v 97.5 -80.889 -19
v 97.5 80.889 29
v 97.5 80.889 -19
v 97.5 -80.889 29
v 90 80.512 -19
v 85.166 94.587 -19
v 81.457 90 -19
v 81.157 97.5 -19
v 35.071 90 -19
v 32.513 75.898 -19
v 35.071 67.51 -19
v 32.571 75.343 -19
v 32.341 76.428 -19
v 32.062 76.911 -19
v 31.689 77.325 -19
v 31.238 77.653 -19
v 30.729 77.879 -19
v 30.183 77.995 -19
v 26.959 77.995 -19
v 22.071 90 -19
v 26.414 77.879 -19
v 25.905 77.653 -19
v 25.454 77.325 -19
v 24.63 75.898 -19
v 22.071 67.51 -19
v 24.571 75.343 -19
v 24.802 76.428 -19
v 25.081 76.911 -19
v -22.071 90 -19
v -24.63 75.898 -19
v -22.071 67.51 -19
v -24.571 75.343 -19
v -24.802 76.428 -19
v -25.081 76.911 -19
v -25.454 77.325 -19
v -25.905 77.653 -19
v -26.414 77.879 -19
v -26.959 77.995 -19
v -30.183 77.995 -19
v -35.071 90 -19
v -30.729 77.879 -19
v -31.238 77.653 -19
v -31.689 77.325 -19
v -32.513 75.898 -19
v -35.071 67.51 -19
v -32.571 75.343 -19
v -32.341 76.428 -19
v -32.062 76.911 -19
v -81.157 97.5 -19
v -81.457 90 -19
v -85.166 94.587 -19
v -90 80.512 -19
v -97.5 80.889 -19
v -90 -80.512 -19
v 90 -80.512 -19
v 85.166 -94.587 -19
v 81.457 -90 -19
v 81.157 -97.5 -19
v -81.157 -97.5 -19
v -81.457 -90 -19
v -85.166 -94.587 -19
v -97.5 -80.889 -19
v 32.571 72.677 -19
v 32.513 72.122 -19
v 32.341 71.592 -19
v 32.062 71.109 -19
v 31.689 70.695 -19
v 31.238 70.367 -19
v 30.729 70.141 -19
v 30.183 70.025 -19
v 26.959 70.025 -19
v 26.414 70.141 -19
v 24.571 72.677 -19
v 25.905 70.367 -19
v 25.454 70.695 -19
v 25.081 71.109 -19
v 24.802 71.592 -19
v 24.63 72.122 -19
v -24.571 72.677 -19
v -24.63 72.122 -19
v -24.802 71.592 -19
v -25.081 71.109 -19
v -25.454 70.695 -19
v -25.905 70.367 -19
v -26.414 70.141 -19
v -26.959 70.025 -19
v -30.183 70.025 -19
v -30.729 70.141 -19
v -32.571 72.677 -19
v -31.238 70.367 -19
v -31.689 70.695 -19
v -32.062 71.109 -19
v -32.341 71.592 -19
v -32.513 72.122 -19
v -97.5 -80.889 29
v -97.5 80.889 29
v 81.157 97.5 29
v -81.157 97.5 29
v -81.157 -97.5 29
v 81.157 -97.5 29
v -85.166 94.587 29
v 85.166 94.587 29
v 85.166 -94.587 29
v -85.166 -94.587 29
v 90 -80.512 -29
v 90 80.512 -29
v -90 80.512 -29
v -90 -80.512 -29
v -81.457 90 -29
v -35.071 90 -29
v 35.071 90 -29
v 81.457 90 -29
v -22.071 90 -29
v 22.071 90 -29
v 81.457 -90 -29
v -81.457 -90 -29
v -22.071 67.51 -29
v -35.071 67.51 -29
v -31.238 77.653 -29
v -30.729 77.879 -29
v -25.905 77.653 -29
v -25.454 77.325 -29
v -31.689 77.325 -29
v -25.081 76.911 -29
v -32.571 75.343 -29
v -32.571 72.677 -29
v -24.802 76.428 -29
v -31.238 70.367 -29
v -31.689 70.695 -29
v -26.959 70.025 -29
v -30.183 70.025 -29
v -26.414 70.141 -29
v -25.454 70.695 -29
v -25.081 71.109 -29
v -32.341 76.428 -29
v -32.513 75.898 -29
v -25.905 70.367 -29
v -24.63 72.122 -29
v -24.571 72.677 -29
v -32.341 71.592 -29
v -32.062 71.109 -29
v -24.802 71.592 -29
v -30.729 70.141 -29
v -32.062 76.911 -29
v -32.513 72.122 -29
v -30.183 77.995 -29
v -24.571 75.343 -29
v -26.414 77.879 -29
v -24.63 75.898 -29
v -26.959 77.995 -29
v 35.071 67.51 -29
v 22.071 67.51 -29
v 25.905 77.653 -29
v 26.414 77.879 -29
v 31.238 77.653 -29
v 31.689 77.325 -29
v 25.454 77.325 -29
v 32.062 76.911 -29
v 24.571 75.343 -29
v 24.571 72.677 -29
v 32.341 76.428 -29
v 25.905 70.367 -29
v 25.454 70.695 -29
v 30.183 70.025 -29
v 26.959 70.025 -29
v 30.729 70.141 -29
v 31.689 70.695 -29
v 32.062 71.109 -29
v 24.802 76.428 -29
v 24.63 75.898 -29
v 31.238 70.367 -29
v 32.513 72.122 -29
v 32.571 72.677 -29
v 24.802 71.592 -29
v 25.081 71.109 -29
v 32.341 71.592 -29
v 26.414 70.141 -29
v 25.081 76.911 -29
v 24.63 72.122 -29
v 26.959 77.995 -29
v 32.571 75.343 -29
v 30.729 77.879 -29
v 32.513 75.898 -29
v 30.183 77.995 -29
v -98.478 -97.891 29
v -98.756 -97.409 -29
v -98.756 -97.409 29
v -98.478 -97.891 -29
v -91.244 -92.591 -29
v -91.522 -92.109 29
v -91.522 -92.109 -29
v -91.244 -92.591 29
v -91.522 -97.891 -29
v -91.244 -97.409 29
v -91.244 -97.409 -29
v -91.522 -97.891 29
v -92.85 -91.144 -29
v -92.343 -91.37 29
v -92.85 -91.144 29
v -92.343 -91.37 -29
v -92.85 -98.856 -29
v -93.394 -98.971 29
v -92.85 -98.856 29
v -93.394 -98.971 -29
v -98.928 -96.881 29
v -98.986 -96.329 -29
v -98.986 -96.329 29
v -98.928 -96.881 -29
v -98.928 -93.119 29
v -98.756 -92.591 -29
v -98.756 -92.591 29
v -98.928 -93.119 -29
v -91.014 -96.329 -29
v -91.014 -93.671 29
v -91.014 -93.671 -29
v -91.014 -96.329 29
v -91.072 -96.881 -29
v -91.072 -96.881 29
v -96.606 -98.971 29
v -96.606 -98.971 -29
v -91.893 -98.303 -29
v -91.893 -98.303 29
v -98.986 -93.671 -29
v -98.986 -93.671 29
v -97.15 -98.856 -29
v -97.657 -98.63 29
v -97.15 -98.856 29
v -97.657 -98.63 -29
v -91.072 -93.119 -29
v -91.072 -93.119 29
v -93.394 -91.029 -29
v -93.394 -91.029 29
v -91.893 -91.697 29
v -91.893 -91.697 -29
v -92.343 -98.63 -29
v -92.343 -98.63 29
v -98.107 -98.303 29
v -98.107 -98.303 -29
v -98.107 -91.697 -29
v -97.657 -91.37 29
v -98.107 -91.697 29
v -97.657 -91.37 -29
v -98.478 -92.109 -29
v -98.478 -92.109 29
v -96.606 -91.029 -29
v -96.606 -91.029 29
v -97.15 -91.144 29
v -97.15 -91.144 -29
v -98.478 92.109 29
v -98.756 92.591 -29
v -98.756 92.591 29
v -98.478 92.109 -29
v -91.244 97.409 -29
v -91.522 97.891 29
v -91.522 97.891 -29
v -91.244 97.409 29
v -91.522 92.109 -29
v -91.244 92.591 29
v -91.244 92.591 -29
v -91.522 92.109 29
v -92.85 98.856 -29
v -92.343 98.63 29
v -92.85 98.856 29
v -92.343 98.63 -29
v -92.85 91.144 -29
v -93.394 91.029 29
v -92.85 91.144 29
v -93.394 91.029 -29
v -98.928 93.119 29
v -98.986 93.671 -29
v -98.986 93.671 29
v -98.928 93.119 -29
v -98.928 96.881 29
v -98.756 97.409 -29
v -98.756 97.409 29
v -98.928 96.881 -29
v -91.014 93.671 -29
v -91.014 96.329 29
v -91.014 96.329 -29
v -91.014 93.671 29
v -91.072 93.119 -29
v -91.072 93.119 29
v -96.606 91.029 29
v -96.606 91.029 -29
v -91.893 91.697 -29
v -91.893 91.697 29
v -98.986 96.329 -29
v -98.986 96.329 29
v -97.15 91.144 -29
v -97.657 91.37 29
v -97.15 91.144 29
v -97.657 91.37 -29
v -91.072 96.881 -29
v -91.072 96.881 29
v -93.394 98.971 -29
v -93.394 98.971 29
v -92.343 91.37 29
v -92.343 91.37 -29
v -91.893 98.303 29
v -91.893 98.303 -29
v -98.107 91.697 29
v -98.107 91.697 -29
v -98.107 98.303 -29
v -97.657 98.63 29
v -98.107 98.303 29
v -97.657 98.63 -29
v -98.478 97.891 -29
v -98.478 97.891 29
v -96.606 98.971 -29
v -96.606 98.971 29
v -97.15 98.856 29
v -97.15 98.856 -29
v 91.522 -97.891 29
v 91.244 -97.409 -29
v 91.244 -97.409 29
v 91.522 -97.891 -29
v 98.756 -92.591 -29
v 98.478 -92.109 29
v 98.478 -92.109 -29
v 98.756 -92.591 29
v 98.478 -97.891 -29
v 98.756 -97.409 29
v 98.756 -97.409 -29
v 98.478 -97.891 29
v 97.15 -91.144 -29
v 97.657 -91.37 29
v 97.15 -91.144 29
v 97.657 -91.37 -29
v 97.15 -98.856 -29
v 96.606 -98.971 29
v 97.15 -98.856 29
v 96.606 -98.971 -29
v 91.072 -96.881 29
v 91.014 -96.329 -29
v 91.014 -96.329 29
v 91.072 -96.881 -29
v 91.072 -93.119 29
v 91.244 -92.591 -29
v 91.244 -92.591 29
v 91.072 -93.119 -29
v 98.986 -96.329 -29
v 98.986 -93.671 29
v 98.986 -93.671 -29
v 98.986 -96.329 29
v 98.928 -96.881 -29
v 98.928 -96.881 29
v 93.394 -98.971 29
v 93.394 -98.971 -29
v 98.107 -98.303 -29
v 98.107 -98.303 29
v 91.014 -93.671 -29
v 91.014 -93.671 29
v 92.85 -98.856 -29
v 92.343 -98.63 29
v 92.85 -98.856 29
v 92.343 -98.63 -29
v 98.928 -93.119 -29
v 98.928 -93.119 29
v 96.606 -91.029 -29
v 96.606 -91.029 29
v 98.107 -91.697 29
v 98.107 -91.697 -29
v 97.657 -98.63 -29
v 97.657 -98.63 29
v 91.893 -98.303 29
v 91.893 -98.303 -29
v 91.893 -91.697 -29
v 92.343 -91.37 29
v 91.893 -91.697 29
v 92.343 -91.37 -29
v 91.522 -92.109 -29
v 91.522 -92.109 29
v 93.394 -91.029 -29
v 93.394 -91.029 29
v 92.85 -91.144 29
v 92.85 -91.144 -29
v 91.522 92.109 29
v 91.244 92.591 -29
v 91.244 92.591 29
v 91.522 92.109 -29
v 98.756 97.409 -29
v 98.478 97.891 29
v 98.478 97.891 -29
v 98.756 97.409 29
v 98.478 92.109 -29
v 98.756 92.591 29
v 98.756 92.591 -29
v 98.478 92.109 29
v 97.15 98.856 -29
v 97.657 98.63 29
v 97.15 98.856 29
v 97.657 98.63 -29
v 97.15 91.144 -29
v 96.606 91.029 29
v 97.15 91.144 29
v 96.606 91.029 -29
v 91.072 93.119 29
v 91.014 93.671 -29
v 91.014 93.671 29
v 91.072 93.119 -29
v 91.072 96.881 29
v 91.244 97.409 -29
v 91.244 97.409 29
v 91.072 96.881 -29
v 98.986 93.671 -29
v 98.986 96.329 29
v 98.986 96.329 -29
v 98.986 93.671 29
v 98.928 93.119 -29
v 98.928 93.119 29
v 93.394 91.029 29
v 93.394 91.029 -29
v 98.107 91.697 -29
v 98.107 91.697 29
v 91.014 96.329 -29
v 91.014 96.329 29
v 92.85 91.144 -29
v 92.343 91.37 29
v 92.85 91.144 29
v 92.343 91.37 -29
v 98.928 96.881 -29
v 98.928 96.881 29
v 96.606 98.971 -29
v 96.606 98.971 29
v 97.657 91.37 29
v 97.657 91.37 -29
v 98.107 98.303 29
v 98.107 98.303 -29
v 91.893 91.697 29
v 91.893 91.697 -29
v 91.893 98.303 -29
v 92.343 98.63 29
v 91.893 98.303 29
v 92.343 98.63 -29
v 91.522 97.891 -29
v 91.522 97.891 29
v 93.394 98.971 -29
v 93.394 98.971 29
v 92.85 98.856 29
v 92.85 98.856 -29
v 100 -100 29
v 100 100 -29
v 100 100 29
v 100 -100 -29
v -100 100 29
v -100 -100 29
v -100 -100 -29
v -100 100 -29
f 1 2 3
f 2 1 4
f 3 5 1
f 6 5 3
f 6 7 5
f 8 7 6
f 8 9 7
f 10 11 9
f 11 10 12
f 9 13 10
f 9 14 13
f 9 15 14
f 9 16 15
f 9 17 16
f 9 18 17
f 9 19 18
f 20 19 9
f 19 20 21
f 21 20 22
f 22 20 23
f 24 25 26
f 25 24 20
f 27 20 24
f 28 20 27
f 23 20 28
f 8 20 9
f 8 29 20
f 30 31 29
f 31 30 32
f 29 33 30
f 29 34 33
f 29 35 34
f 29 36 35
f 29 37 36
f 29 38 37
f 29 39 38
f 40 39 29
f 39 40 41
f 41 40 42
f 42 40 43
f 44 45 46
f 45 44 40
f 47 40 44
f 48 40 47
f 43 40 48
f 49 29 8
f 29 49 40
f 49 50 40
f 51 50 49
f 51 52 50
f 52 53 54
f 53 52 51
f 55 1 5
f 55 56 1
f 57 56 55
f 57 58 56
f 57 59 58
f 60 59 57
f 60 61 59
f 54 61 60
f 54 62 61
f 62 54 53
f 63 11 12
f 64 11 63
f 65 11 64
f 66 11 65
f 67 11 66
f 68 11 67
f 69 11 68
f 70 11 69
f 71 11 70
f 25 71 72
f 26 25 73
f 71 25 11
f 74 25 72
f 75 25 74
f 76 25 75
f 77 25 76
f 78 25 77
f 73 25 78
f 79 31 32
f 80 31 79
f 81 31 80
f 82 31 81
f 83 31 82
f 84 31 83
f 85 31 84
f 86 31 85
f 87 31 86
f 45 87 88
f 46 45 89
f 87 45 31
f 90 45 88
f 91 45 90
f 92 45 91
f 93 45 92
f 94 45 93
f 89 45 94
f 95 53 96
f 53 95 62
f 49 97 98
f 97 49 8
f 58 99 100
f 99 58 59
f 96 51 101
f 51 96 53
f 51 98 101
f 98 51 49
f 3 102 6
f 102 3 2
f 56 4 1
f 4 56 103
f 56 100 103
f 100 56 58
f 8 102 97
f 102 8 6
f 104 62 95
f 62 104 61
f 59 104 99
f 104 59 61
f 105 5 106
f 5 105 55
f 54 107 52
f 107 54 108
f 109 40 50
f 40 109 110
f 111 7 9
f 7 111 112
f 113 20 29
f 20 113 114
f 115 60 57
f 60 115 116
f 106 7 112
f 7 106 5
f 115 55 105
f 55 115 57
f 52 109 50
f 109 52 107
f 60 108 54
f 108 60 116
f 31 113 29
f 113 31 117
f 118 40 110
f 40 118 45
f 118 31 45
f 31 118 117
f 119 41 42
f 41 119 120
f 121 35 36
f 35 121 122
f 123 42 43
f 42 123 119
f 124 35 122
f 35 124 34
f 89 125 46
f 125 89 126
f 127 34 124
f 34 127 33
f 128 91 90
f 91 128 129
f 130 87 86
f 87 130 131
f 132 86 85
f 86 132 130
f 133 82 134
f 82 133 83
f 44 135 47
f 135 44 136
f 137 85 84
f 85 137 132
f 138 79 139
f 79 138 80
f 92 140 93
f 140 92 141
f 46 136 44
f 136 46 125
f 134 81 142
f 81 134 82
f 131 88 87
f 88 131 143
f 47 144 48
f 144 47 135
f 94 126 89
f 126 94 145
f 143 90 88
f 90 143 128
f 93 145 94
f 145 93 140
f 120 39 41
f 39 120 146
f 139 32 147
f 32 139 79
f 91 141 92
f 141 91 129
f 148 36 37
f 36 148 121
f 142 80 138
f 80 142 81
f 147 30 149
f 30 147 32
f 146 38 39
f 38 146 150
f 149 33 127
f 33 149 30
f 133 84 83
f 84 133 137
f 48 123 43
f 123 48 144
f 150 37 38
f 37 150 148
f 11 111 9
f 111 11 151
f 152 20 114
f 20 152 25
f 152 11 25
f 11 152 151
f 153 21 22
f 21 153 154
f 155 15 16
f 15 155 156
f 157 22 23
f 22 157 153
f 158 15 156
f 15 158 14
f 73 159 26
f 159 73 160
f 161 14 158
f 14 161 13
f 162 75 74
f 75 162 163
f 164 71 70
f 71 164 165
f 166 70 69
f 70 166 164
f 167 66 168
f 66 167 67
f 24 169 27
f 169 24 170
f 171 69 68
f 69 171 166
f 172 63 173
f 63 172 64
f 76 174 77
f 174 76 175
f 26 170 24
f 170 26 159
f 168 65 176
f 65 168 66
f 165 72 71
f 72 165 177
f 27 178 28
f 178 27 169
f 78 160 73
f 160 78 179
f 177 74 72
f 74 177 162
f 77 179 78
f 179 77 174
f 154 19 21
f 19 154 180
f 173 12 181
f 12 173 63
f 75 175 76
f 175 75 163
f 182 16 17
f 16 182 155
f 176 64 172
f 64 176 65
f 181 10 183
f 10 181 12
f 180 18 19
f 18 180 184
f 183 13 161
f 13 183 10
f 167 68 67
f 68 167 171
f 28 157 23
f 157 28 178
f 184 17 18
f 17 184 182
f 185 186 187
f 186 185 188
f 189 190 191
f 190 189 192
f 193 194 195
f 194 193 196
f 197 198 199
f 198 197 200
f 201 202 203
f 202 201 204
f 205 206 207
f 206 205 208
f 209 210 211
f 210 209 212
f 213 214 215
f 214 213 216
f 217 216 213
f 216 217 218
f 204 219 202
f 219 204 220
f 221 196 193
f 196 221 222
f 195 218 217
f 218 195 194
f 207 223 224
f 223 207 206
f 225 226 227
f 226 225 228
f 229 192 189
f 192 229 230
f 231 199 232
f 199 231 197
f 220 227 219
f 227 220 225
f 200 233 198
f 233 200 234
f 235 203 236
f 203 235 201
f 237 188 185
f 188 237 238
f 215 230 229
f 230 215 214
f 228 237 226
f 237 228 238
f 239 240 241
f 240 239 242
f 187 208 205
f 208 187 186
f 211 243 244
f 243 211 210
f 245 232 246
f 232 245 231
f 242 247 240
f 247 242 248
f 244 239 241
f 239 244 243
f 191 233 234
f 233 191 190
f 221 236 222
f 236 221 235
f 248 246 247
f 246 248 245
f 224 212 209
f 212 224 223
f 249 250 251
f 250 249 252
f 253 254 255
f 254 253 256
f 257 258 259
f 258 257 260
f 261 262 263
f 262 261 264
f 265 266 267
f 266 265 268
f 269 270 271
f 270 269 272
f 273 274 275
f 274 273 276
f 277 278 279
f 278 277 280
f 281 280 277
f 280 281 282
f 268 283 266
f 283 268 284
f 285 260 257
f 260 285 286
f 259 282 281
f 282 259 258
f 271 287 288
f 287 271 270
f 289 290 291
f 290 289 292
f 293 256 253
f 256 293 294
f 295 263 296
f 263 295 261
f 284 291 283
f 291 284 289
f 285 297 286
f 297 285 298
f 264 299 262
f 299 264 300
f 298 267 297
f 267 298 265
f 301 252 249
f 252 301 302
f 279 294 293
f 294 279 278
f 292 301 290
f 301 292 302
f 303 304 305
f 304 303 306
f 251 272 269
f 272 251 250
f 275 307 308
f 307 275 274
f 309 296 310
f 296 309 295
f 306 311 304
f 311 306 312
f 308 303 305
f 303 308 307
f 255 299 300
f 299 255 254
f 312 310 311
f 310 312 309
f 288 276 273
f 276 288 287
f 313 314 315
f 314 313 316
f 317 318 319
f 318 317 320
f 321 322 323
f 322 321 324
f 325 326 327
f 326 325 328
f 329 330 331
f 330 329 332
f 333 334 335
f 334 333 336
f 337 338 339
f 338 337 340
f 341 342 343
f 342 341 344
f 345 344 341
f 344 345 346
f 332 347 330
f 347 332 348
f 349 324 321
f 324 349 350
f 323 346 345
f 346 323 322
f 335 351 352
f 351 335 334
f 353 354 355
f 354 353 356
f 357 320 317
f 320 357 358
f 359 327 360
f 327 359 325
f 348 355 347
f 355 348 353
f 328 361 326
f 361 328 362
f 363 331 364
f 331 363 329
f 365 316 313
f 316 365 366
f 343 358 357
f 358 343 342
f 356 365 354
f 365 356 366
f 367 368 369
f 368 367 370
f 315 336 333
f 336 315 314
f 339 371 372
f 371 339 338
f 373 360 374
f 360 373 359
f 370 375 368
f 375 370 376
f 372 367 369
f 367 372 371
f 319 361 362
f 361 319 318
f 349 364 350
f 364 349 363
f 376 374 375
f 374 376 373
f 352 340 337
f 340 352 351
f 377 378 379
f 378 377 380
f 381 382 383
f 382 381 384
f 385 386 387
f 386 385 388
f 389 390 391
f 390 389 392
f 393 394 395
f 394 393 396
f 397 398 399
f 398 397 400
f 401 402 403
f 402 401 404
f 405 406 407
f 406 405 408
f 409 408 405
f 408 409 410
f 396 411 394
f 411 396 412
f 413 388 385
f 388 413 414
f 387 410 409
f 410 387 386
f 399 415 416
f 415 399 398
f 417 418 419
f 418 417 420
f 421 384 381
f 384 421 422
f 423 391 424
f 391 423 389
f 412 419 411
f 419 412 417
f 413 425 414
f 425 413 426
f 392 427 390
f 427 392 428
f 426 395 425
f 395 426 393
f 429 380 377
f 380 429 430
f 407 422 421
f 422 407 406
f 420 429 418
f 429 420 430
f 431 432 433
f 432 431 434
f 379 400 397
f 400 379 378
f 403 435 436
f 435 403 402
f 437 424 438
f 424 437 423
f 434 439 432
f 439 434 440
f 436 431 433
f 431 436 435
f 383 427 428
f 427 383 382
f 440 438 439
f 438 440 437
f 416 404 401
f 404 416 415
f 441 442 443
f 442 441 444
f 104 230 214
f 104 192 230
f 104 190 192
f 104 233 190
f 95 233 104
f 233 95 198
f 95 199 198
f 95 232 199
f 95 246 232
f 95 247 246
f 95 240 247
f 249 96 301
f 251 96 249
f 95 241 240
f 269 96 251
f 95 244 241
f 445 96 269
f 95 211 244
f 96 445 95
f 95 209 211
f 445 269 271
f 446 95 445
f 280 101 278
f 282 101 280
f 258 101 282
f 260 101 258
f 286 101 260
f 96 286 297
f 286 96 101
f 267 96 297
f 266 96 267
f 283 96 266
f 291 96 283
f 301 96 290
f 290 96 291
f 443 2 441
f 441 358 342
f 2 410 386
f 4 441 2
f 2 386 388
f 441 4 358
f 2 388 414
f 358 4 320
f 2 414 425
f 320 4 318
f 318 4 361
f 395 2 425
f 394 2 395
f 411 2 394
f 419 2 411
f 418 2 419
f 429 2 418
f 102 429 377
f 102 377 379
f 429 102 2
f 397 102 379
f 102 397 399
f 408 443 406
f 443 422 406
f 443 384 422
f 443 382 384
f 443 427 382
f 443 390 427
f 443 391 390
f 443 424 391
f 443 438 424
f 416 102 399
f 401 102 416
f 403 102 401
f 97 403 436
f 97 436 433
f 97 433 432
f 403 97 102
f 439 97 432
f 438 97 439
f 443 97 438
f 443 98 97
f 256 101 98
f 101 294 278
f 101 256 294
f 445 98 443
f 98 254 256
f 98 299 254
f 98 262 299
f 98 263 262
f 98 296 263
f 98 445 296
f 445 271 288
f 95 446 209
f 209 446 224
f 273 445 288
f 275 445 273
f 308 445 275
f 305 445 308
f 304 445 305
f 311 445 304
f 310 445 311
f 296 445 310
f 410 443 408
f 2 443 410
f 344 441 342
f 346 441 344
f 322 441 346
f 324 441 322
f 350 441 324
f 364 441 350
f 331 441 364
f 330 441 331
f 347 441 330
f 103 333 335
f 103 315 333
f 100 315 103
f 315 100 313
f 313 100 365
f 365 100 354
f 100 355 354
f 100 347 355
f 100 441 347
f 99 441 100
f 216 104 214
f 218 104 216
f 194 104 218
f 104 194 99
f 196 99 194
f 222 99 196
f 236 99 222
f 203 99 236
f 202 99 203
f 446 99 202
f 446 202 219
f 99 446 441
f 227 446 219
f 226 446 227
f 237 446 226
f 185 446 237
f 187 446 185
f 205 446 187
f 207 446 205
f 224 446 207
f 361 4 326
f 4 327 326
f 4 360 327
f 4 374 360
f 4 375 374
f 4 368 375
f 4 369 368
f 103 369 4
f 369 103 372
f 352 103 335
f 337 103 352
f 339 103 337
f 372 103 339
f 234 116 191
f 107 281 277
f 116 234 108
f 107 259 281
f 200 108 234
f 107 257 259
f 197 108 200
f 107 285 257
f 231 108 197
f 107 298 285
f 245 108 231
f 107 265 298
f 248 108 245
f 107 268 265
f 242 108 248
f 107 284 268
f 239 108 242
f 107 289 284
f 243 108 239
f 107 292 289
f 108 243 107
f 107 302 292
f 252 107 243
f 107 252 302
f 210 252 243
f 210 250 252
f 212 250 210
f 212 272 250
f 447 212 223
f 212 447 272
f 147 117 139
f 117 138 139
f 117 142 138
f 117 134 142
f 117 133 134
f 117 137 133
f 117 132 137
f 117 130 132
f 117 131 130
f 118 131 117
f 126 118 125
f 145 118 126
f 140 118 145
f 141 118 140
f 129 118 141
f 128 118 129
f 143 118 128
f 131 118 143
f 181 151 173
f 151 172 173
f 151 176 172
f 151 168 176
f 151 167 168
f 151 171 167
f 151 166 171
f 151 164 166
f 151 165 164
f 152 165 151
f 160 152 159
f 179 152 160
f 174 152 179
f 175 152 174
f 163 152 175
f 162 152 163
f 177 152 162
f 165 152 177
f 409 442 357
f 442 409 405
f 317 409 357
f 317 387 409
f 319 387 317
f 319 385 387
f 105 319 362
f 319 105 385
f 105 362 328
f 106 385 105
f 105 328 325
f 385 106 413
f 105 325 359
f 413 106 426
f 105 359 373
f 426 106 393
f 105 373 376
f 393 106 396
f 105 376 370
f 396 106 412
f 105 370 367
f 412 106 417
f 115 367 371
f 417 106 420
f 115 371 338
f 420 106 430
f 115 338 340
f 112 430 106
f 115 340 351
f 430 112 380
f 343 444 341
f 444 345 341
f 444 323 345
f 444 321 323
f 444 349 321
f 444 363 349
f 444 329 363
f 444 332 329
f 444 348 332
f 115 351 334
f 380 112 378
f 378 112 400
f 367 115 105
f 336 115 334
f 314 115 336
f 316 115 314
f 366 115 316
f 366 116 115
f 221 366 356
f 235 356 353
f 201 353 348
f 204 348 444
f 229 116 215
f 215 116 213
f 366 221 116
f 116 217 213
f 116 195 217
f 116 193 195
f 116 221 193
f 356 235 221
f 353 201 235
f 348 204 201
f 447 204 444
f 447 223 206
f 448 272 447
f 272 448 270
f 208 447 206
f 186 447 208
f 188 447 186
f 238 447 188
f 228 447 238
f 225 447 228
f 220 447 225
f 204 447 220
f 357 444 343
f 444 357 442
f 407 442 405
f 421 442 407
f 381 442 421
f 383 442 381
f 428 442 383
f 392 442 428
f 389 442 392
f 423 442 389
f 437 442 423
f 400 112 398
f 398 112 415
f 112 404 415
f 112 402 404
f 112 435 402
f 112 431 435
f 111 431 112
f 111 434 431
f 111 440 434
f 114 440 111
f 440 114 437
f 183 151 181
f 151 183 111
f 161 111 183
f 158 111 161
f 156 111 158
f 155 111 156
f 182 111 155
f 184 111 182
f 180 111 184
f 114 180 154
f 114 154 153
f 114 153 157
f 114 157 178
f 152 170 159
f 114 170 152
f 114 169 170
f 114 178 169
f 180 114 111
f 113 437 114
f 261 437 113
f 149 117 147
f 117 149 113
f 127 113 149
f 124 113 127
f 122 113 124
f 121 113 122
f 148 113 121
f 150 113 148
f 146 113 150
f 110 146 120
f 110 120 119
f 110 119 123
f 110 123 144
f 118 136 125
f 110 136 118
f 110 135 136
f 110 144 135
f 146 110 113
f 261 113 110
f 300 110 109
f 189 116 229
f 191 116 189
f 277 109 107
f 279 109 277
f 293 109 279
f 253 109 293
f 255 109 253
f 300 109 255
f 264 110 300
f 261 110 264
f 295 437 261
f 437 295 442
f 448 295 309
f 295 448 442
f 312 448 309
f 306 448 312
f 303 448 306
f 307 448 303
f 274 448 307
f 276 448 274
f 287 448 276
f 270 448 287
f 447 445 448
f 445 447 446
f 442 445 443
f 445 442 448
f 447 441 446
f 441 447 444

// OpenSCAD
// file: press_fit.scad
include <config.scad>

module press_fit(d=0, h=0, center=false) {

	linear_extrude(height=h, center=center)
		minkowski() {
			square([d/3,d/3], center=true);
			circle(r=d/3);
		}
}

difference() {
	press_fit(d=20, h=24, center=true);
	cylinder(d=20, h=24+e, center=true);
}
// file: standard.scad
BOLT_D = [
	-1, //0 index is not used but reduces computation
	-1,
	-1,
	2.980,	//m3
	3.978,	//m4
	4.976,	//m5
	5.974,	//m6
	-1,
	7.972,	//m8
	-1,
	9.968,	//m10
	-1,
	11.966	//m12
];

NUT_D = [
	-1, //0 index is not used but reduces computation
	-1,
	-1,
	6.40,	//m3
	8.10,	//m4
	9.20,	//m5
	11.50,	//m6
	-1,
	15.00,	//m8
	-1,
	19.60,	//m10
	-1,
	22.10	//m12
];

NUT_H = [
	-1, //0 index is not used but reduces computation
	-1,
	-1,
	2.40,	//m3
	3.20,	//m4
	4.00,	//m5
	5.00,	//m6
	-1,
	6.50,	//m8
	-1,
	8.00,	//m10
	-1,
	10.00	//m12
];

NEMA_F = [	//faceplate size
	-1,-1,-1,-1,-1,-1,-1,-1,-1,-1,-1,
	28.0,	//Nema11
	-1,-1,
	35.6,	//Nema14
	-1,-1,
	42.3,	//Nema17
	-1,-1,-1,-1,-1,
	58.4	//Nema23
];

NEMA_H = [	//halved distance between holes
	-1,-1,-1,-1,-1,-1,-1,-1,-1,-1,-1,
	11.50,	//Nema11
	-1,-1,
	13.00,	//Nema14
	-1,-1,
	15.50,	//Nema17
	-1,-1,-1,-1,-1,
	23.57	//Nema23
];

NEMA_S = [	//shaft diameter
	-1,-1,-1,-1,-1,-1,-1,-1,-1,-1,-1,
	4.0,	//Nema11
	-1,-1,
	5.0,	//Nema14
	-1,-1,
	5.0,	//Nema17
	-1,-1,-1,-1,-1,
	6.35	//Nema23
];
// file: config.scad
include <standard.scad>

//render & print
$fs=.5;						//minimum arc segment
e=.1;						//extra length for manfold mesh (do not change)
tol=.5;						//xy compensation for small holes

//$t=.35;					//
x=0;//*cos($t*360);			// printhead position
y=0;//*sin($t*360);		//

wall=5/2;					//(some) thin wall thickness

//frame
f_t=10;						//frame thickness
f_x=200;
f_y=200;
f_z=65;
f_tr=8;						//corner threaded rods ISO diameter 
fy_ko=2;					//keepout between frame and x_carriage

//microswitch
ms_h=6;						//height
ms_l=13;					//length
ms_t=6;						//thickness

//motors
ab_motor=17;				//xy motors
ab_motor_l=47;				//xy motors length
z_motor=17;					//z motor
z_motor_l=47;				//z motor length

//x
x_d=15;						//bearing diameter
x_l=24;						//bearing length
x_s=8;						//shaft diameter
x_fan=30;					//hotend fan diameter
x_blower=35;				//blower fan diameter
x_fans_m=6;					//fan and blower mount holes spacing

x_fan_duct=28;
x_blower_duct=25;
x_shroud=10;
x_shroud_t=5;
x_shroud_w=2;


//y
y_d=15;						//bearing diameter
y_l=24;						//bearing length
y_s=8;						//shaft diameter
y_shaft_distance_extra=3;	//extra distance between shafts
y_sp=6;						//shaft position (relative to frame)


//z
z_s=8;						//shaft diameter
z_l=24*2;					//bearing length
z_d=15;						//bearing diameter


//idler
idler_d=8;					//groove bearing OD
idler_l=3;					//groove bearing thickness
idler_s=3;					//groove bearing ID

idler_hk=2;					//idler horizontal keepout
idler_vk=.5;				//idler verical keepout (washer thickness?)

//pulley
pulley_d=200/PI/5;			//5 steps per mm (80 with 16x microstepping)
pulley_h=2;
pulley_rivet=1.5;
pulley_flat_shaft=true;

//bed
bed_x=100;
bed_y=100;

// ------
//  math
// ------
pulley_length = pulley_h+4*pulley_rivet+NUT_D[3];
pulley_diameter = pulley_d+pulley_rivet*2;
pulley_wire_height = pulley_h/2+pulley_rivet*2+NUT_D[3];
pulley_screw_length = (pulley_diameter-NEMA_S[17])/2;

y_shaft_distance = NEMA_F[ab_motor]+y_s+y_shaft_distance_extra;

x_shaft_distance = y_shaft_distance-y_d-y_s;

ab_motor_xpos = f_x/2-f_t-y_sp-y_d/2-wall;
ab_motor_ypos = f_y/2-f_t-(NEMA_H[ab_motor]*2+BOLT_D[3])/2+(f_t-f_tr)/2;


z_shaft_distance = bed_x/2-wall;
z_carriage_arm = NEMA_F[ab_motor]/2+y_l/2+x_d/2+wall+x_fan/2;
z_carriage_arm_max = ab_motor_ypos+f_y/2-f_t-x_fan/2;




use <press_fit.scad>
// main file
include <config.scad>

module frame_bottom(ghosts=true) {
	
	difference() {
		
		union() {
			cube([f_x,f_y,z_l+f_t], center=true);			
		}
		
		
		translate([0,0,f_t/2+e/2])
			intersection() {
				cube([f_x-wall*2, f_y-wall*2, z_l+e], center=true);
				cylinder(r=sqrt(pow(f_x/2,2)+pow(f_y/2,2))-f_t*sqrt(2), h=z_l+e*2, center=true);
			}
		translate([0,0,-z_l/2])
			difference() {
				intersection() {
					cube([f_x-f_t*2,f_y-f_t*2,f_t+e], center=true);
					cylinder(r=sqrt(pow(f_x/2,2)+pow(f_y/2,2))-f_t*2, h=f_t+e*2, center=true);
				}
				
				for(i=[-1,1])					//z shaft holder
				translate([z_shaft_distance/2*i, 0, 0])
					difference() {
						translate([0,f_y/2-(f_y/2-ab_motor_ypos+z_s/2+wall)/2,0])
							cube([z_s+wall*2, f_y/2-ab_motor_ypos+z_s/2+wall, (f_z-NEMA_F[ab_motor])/2], center=true);
						translate([0,ab_motor_ypos,0])
							press_fit(d=z_s, h=(f_z-NEMA_F[ab_motor])/2+e, center=true);
					}
			}
		
		for(i=[-1,1]) for (j=[-1,1])
			translate([(f_x-f_t)*i/2,(f_y-f_t)*j/2,0])
				press_fit(d=BOLT_D[f_tr], h=z_l+f_t+e, center=true);
				
		
	}
	
}

frame_bottom(ghosts=true);
